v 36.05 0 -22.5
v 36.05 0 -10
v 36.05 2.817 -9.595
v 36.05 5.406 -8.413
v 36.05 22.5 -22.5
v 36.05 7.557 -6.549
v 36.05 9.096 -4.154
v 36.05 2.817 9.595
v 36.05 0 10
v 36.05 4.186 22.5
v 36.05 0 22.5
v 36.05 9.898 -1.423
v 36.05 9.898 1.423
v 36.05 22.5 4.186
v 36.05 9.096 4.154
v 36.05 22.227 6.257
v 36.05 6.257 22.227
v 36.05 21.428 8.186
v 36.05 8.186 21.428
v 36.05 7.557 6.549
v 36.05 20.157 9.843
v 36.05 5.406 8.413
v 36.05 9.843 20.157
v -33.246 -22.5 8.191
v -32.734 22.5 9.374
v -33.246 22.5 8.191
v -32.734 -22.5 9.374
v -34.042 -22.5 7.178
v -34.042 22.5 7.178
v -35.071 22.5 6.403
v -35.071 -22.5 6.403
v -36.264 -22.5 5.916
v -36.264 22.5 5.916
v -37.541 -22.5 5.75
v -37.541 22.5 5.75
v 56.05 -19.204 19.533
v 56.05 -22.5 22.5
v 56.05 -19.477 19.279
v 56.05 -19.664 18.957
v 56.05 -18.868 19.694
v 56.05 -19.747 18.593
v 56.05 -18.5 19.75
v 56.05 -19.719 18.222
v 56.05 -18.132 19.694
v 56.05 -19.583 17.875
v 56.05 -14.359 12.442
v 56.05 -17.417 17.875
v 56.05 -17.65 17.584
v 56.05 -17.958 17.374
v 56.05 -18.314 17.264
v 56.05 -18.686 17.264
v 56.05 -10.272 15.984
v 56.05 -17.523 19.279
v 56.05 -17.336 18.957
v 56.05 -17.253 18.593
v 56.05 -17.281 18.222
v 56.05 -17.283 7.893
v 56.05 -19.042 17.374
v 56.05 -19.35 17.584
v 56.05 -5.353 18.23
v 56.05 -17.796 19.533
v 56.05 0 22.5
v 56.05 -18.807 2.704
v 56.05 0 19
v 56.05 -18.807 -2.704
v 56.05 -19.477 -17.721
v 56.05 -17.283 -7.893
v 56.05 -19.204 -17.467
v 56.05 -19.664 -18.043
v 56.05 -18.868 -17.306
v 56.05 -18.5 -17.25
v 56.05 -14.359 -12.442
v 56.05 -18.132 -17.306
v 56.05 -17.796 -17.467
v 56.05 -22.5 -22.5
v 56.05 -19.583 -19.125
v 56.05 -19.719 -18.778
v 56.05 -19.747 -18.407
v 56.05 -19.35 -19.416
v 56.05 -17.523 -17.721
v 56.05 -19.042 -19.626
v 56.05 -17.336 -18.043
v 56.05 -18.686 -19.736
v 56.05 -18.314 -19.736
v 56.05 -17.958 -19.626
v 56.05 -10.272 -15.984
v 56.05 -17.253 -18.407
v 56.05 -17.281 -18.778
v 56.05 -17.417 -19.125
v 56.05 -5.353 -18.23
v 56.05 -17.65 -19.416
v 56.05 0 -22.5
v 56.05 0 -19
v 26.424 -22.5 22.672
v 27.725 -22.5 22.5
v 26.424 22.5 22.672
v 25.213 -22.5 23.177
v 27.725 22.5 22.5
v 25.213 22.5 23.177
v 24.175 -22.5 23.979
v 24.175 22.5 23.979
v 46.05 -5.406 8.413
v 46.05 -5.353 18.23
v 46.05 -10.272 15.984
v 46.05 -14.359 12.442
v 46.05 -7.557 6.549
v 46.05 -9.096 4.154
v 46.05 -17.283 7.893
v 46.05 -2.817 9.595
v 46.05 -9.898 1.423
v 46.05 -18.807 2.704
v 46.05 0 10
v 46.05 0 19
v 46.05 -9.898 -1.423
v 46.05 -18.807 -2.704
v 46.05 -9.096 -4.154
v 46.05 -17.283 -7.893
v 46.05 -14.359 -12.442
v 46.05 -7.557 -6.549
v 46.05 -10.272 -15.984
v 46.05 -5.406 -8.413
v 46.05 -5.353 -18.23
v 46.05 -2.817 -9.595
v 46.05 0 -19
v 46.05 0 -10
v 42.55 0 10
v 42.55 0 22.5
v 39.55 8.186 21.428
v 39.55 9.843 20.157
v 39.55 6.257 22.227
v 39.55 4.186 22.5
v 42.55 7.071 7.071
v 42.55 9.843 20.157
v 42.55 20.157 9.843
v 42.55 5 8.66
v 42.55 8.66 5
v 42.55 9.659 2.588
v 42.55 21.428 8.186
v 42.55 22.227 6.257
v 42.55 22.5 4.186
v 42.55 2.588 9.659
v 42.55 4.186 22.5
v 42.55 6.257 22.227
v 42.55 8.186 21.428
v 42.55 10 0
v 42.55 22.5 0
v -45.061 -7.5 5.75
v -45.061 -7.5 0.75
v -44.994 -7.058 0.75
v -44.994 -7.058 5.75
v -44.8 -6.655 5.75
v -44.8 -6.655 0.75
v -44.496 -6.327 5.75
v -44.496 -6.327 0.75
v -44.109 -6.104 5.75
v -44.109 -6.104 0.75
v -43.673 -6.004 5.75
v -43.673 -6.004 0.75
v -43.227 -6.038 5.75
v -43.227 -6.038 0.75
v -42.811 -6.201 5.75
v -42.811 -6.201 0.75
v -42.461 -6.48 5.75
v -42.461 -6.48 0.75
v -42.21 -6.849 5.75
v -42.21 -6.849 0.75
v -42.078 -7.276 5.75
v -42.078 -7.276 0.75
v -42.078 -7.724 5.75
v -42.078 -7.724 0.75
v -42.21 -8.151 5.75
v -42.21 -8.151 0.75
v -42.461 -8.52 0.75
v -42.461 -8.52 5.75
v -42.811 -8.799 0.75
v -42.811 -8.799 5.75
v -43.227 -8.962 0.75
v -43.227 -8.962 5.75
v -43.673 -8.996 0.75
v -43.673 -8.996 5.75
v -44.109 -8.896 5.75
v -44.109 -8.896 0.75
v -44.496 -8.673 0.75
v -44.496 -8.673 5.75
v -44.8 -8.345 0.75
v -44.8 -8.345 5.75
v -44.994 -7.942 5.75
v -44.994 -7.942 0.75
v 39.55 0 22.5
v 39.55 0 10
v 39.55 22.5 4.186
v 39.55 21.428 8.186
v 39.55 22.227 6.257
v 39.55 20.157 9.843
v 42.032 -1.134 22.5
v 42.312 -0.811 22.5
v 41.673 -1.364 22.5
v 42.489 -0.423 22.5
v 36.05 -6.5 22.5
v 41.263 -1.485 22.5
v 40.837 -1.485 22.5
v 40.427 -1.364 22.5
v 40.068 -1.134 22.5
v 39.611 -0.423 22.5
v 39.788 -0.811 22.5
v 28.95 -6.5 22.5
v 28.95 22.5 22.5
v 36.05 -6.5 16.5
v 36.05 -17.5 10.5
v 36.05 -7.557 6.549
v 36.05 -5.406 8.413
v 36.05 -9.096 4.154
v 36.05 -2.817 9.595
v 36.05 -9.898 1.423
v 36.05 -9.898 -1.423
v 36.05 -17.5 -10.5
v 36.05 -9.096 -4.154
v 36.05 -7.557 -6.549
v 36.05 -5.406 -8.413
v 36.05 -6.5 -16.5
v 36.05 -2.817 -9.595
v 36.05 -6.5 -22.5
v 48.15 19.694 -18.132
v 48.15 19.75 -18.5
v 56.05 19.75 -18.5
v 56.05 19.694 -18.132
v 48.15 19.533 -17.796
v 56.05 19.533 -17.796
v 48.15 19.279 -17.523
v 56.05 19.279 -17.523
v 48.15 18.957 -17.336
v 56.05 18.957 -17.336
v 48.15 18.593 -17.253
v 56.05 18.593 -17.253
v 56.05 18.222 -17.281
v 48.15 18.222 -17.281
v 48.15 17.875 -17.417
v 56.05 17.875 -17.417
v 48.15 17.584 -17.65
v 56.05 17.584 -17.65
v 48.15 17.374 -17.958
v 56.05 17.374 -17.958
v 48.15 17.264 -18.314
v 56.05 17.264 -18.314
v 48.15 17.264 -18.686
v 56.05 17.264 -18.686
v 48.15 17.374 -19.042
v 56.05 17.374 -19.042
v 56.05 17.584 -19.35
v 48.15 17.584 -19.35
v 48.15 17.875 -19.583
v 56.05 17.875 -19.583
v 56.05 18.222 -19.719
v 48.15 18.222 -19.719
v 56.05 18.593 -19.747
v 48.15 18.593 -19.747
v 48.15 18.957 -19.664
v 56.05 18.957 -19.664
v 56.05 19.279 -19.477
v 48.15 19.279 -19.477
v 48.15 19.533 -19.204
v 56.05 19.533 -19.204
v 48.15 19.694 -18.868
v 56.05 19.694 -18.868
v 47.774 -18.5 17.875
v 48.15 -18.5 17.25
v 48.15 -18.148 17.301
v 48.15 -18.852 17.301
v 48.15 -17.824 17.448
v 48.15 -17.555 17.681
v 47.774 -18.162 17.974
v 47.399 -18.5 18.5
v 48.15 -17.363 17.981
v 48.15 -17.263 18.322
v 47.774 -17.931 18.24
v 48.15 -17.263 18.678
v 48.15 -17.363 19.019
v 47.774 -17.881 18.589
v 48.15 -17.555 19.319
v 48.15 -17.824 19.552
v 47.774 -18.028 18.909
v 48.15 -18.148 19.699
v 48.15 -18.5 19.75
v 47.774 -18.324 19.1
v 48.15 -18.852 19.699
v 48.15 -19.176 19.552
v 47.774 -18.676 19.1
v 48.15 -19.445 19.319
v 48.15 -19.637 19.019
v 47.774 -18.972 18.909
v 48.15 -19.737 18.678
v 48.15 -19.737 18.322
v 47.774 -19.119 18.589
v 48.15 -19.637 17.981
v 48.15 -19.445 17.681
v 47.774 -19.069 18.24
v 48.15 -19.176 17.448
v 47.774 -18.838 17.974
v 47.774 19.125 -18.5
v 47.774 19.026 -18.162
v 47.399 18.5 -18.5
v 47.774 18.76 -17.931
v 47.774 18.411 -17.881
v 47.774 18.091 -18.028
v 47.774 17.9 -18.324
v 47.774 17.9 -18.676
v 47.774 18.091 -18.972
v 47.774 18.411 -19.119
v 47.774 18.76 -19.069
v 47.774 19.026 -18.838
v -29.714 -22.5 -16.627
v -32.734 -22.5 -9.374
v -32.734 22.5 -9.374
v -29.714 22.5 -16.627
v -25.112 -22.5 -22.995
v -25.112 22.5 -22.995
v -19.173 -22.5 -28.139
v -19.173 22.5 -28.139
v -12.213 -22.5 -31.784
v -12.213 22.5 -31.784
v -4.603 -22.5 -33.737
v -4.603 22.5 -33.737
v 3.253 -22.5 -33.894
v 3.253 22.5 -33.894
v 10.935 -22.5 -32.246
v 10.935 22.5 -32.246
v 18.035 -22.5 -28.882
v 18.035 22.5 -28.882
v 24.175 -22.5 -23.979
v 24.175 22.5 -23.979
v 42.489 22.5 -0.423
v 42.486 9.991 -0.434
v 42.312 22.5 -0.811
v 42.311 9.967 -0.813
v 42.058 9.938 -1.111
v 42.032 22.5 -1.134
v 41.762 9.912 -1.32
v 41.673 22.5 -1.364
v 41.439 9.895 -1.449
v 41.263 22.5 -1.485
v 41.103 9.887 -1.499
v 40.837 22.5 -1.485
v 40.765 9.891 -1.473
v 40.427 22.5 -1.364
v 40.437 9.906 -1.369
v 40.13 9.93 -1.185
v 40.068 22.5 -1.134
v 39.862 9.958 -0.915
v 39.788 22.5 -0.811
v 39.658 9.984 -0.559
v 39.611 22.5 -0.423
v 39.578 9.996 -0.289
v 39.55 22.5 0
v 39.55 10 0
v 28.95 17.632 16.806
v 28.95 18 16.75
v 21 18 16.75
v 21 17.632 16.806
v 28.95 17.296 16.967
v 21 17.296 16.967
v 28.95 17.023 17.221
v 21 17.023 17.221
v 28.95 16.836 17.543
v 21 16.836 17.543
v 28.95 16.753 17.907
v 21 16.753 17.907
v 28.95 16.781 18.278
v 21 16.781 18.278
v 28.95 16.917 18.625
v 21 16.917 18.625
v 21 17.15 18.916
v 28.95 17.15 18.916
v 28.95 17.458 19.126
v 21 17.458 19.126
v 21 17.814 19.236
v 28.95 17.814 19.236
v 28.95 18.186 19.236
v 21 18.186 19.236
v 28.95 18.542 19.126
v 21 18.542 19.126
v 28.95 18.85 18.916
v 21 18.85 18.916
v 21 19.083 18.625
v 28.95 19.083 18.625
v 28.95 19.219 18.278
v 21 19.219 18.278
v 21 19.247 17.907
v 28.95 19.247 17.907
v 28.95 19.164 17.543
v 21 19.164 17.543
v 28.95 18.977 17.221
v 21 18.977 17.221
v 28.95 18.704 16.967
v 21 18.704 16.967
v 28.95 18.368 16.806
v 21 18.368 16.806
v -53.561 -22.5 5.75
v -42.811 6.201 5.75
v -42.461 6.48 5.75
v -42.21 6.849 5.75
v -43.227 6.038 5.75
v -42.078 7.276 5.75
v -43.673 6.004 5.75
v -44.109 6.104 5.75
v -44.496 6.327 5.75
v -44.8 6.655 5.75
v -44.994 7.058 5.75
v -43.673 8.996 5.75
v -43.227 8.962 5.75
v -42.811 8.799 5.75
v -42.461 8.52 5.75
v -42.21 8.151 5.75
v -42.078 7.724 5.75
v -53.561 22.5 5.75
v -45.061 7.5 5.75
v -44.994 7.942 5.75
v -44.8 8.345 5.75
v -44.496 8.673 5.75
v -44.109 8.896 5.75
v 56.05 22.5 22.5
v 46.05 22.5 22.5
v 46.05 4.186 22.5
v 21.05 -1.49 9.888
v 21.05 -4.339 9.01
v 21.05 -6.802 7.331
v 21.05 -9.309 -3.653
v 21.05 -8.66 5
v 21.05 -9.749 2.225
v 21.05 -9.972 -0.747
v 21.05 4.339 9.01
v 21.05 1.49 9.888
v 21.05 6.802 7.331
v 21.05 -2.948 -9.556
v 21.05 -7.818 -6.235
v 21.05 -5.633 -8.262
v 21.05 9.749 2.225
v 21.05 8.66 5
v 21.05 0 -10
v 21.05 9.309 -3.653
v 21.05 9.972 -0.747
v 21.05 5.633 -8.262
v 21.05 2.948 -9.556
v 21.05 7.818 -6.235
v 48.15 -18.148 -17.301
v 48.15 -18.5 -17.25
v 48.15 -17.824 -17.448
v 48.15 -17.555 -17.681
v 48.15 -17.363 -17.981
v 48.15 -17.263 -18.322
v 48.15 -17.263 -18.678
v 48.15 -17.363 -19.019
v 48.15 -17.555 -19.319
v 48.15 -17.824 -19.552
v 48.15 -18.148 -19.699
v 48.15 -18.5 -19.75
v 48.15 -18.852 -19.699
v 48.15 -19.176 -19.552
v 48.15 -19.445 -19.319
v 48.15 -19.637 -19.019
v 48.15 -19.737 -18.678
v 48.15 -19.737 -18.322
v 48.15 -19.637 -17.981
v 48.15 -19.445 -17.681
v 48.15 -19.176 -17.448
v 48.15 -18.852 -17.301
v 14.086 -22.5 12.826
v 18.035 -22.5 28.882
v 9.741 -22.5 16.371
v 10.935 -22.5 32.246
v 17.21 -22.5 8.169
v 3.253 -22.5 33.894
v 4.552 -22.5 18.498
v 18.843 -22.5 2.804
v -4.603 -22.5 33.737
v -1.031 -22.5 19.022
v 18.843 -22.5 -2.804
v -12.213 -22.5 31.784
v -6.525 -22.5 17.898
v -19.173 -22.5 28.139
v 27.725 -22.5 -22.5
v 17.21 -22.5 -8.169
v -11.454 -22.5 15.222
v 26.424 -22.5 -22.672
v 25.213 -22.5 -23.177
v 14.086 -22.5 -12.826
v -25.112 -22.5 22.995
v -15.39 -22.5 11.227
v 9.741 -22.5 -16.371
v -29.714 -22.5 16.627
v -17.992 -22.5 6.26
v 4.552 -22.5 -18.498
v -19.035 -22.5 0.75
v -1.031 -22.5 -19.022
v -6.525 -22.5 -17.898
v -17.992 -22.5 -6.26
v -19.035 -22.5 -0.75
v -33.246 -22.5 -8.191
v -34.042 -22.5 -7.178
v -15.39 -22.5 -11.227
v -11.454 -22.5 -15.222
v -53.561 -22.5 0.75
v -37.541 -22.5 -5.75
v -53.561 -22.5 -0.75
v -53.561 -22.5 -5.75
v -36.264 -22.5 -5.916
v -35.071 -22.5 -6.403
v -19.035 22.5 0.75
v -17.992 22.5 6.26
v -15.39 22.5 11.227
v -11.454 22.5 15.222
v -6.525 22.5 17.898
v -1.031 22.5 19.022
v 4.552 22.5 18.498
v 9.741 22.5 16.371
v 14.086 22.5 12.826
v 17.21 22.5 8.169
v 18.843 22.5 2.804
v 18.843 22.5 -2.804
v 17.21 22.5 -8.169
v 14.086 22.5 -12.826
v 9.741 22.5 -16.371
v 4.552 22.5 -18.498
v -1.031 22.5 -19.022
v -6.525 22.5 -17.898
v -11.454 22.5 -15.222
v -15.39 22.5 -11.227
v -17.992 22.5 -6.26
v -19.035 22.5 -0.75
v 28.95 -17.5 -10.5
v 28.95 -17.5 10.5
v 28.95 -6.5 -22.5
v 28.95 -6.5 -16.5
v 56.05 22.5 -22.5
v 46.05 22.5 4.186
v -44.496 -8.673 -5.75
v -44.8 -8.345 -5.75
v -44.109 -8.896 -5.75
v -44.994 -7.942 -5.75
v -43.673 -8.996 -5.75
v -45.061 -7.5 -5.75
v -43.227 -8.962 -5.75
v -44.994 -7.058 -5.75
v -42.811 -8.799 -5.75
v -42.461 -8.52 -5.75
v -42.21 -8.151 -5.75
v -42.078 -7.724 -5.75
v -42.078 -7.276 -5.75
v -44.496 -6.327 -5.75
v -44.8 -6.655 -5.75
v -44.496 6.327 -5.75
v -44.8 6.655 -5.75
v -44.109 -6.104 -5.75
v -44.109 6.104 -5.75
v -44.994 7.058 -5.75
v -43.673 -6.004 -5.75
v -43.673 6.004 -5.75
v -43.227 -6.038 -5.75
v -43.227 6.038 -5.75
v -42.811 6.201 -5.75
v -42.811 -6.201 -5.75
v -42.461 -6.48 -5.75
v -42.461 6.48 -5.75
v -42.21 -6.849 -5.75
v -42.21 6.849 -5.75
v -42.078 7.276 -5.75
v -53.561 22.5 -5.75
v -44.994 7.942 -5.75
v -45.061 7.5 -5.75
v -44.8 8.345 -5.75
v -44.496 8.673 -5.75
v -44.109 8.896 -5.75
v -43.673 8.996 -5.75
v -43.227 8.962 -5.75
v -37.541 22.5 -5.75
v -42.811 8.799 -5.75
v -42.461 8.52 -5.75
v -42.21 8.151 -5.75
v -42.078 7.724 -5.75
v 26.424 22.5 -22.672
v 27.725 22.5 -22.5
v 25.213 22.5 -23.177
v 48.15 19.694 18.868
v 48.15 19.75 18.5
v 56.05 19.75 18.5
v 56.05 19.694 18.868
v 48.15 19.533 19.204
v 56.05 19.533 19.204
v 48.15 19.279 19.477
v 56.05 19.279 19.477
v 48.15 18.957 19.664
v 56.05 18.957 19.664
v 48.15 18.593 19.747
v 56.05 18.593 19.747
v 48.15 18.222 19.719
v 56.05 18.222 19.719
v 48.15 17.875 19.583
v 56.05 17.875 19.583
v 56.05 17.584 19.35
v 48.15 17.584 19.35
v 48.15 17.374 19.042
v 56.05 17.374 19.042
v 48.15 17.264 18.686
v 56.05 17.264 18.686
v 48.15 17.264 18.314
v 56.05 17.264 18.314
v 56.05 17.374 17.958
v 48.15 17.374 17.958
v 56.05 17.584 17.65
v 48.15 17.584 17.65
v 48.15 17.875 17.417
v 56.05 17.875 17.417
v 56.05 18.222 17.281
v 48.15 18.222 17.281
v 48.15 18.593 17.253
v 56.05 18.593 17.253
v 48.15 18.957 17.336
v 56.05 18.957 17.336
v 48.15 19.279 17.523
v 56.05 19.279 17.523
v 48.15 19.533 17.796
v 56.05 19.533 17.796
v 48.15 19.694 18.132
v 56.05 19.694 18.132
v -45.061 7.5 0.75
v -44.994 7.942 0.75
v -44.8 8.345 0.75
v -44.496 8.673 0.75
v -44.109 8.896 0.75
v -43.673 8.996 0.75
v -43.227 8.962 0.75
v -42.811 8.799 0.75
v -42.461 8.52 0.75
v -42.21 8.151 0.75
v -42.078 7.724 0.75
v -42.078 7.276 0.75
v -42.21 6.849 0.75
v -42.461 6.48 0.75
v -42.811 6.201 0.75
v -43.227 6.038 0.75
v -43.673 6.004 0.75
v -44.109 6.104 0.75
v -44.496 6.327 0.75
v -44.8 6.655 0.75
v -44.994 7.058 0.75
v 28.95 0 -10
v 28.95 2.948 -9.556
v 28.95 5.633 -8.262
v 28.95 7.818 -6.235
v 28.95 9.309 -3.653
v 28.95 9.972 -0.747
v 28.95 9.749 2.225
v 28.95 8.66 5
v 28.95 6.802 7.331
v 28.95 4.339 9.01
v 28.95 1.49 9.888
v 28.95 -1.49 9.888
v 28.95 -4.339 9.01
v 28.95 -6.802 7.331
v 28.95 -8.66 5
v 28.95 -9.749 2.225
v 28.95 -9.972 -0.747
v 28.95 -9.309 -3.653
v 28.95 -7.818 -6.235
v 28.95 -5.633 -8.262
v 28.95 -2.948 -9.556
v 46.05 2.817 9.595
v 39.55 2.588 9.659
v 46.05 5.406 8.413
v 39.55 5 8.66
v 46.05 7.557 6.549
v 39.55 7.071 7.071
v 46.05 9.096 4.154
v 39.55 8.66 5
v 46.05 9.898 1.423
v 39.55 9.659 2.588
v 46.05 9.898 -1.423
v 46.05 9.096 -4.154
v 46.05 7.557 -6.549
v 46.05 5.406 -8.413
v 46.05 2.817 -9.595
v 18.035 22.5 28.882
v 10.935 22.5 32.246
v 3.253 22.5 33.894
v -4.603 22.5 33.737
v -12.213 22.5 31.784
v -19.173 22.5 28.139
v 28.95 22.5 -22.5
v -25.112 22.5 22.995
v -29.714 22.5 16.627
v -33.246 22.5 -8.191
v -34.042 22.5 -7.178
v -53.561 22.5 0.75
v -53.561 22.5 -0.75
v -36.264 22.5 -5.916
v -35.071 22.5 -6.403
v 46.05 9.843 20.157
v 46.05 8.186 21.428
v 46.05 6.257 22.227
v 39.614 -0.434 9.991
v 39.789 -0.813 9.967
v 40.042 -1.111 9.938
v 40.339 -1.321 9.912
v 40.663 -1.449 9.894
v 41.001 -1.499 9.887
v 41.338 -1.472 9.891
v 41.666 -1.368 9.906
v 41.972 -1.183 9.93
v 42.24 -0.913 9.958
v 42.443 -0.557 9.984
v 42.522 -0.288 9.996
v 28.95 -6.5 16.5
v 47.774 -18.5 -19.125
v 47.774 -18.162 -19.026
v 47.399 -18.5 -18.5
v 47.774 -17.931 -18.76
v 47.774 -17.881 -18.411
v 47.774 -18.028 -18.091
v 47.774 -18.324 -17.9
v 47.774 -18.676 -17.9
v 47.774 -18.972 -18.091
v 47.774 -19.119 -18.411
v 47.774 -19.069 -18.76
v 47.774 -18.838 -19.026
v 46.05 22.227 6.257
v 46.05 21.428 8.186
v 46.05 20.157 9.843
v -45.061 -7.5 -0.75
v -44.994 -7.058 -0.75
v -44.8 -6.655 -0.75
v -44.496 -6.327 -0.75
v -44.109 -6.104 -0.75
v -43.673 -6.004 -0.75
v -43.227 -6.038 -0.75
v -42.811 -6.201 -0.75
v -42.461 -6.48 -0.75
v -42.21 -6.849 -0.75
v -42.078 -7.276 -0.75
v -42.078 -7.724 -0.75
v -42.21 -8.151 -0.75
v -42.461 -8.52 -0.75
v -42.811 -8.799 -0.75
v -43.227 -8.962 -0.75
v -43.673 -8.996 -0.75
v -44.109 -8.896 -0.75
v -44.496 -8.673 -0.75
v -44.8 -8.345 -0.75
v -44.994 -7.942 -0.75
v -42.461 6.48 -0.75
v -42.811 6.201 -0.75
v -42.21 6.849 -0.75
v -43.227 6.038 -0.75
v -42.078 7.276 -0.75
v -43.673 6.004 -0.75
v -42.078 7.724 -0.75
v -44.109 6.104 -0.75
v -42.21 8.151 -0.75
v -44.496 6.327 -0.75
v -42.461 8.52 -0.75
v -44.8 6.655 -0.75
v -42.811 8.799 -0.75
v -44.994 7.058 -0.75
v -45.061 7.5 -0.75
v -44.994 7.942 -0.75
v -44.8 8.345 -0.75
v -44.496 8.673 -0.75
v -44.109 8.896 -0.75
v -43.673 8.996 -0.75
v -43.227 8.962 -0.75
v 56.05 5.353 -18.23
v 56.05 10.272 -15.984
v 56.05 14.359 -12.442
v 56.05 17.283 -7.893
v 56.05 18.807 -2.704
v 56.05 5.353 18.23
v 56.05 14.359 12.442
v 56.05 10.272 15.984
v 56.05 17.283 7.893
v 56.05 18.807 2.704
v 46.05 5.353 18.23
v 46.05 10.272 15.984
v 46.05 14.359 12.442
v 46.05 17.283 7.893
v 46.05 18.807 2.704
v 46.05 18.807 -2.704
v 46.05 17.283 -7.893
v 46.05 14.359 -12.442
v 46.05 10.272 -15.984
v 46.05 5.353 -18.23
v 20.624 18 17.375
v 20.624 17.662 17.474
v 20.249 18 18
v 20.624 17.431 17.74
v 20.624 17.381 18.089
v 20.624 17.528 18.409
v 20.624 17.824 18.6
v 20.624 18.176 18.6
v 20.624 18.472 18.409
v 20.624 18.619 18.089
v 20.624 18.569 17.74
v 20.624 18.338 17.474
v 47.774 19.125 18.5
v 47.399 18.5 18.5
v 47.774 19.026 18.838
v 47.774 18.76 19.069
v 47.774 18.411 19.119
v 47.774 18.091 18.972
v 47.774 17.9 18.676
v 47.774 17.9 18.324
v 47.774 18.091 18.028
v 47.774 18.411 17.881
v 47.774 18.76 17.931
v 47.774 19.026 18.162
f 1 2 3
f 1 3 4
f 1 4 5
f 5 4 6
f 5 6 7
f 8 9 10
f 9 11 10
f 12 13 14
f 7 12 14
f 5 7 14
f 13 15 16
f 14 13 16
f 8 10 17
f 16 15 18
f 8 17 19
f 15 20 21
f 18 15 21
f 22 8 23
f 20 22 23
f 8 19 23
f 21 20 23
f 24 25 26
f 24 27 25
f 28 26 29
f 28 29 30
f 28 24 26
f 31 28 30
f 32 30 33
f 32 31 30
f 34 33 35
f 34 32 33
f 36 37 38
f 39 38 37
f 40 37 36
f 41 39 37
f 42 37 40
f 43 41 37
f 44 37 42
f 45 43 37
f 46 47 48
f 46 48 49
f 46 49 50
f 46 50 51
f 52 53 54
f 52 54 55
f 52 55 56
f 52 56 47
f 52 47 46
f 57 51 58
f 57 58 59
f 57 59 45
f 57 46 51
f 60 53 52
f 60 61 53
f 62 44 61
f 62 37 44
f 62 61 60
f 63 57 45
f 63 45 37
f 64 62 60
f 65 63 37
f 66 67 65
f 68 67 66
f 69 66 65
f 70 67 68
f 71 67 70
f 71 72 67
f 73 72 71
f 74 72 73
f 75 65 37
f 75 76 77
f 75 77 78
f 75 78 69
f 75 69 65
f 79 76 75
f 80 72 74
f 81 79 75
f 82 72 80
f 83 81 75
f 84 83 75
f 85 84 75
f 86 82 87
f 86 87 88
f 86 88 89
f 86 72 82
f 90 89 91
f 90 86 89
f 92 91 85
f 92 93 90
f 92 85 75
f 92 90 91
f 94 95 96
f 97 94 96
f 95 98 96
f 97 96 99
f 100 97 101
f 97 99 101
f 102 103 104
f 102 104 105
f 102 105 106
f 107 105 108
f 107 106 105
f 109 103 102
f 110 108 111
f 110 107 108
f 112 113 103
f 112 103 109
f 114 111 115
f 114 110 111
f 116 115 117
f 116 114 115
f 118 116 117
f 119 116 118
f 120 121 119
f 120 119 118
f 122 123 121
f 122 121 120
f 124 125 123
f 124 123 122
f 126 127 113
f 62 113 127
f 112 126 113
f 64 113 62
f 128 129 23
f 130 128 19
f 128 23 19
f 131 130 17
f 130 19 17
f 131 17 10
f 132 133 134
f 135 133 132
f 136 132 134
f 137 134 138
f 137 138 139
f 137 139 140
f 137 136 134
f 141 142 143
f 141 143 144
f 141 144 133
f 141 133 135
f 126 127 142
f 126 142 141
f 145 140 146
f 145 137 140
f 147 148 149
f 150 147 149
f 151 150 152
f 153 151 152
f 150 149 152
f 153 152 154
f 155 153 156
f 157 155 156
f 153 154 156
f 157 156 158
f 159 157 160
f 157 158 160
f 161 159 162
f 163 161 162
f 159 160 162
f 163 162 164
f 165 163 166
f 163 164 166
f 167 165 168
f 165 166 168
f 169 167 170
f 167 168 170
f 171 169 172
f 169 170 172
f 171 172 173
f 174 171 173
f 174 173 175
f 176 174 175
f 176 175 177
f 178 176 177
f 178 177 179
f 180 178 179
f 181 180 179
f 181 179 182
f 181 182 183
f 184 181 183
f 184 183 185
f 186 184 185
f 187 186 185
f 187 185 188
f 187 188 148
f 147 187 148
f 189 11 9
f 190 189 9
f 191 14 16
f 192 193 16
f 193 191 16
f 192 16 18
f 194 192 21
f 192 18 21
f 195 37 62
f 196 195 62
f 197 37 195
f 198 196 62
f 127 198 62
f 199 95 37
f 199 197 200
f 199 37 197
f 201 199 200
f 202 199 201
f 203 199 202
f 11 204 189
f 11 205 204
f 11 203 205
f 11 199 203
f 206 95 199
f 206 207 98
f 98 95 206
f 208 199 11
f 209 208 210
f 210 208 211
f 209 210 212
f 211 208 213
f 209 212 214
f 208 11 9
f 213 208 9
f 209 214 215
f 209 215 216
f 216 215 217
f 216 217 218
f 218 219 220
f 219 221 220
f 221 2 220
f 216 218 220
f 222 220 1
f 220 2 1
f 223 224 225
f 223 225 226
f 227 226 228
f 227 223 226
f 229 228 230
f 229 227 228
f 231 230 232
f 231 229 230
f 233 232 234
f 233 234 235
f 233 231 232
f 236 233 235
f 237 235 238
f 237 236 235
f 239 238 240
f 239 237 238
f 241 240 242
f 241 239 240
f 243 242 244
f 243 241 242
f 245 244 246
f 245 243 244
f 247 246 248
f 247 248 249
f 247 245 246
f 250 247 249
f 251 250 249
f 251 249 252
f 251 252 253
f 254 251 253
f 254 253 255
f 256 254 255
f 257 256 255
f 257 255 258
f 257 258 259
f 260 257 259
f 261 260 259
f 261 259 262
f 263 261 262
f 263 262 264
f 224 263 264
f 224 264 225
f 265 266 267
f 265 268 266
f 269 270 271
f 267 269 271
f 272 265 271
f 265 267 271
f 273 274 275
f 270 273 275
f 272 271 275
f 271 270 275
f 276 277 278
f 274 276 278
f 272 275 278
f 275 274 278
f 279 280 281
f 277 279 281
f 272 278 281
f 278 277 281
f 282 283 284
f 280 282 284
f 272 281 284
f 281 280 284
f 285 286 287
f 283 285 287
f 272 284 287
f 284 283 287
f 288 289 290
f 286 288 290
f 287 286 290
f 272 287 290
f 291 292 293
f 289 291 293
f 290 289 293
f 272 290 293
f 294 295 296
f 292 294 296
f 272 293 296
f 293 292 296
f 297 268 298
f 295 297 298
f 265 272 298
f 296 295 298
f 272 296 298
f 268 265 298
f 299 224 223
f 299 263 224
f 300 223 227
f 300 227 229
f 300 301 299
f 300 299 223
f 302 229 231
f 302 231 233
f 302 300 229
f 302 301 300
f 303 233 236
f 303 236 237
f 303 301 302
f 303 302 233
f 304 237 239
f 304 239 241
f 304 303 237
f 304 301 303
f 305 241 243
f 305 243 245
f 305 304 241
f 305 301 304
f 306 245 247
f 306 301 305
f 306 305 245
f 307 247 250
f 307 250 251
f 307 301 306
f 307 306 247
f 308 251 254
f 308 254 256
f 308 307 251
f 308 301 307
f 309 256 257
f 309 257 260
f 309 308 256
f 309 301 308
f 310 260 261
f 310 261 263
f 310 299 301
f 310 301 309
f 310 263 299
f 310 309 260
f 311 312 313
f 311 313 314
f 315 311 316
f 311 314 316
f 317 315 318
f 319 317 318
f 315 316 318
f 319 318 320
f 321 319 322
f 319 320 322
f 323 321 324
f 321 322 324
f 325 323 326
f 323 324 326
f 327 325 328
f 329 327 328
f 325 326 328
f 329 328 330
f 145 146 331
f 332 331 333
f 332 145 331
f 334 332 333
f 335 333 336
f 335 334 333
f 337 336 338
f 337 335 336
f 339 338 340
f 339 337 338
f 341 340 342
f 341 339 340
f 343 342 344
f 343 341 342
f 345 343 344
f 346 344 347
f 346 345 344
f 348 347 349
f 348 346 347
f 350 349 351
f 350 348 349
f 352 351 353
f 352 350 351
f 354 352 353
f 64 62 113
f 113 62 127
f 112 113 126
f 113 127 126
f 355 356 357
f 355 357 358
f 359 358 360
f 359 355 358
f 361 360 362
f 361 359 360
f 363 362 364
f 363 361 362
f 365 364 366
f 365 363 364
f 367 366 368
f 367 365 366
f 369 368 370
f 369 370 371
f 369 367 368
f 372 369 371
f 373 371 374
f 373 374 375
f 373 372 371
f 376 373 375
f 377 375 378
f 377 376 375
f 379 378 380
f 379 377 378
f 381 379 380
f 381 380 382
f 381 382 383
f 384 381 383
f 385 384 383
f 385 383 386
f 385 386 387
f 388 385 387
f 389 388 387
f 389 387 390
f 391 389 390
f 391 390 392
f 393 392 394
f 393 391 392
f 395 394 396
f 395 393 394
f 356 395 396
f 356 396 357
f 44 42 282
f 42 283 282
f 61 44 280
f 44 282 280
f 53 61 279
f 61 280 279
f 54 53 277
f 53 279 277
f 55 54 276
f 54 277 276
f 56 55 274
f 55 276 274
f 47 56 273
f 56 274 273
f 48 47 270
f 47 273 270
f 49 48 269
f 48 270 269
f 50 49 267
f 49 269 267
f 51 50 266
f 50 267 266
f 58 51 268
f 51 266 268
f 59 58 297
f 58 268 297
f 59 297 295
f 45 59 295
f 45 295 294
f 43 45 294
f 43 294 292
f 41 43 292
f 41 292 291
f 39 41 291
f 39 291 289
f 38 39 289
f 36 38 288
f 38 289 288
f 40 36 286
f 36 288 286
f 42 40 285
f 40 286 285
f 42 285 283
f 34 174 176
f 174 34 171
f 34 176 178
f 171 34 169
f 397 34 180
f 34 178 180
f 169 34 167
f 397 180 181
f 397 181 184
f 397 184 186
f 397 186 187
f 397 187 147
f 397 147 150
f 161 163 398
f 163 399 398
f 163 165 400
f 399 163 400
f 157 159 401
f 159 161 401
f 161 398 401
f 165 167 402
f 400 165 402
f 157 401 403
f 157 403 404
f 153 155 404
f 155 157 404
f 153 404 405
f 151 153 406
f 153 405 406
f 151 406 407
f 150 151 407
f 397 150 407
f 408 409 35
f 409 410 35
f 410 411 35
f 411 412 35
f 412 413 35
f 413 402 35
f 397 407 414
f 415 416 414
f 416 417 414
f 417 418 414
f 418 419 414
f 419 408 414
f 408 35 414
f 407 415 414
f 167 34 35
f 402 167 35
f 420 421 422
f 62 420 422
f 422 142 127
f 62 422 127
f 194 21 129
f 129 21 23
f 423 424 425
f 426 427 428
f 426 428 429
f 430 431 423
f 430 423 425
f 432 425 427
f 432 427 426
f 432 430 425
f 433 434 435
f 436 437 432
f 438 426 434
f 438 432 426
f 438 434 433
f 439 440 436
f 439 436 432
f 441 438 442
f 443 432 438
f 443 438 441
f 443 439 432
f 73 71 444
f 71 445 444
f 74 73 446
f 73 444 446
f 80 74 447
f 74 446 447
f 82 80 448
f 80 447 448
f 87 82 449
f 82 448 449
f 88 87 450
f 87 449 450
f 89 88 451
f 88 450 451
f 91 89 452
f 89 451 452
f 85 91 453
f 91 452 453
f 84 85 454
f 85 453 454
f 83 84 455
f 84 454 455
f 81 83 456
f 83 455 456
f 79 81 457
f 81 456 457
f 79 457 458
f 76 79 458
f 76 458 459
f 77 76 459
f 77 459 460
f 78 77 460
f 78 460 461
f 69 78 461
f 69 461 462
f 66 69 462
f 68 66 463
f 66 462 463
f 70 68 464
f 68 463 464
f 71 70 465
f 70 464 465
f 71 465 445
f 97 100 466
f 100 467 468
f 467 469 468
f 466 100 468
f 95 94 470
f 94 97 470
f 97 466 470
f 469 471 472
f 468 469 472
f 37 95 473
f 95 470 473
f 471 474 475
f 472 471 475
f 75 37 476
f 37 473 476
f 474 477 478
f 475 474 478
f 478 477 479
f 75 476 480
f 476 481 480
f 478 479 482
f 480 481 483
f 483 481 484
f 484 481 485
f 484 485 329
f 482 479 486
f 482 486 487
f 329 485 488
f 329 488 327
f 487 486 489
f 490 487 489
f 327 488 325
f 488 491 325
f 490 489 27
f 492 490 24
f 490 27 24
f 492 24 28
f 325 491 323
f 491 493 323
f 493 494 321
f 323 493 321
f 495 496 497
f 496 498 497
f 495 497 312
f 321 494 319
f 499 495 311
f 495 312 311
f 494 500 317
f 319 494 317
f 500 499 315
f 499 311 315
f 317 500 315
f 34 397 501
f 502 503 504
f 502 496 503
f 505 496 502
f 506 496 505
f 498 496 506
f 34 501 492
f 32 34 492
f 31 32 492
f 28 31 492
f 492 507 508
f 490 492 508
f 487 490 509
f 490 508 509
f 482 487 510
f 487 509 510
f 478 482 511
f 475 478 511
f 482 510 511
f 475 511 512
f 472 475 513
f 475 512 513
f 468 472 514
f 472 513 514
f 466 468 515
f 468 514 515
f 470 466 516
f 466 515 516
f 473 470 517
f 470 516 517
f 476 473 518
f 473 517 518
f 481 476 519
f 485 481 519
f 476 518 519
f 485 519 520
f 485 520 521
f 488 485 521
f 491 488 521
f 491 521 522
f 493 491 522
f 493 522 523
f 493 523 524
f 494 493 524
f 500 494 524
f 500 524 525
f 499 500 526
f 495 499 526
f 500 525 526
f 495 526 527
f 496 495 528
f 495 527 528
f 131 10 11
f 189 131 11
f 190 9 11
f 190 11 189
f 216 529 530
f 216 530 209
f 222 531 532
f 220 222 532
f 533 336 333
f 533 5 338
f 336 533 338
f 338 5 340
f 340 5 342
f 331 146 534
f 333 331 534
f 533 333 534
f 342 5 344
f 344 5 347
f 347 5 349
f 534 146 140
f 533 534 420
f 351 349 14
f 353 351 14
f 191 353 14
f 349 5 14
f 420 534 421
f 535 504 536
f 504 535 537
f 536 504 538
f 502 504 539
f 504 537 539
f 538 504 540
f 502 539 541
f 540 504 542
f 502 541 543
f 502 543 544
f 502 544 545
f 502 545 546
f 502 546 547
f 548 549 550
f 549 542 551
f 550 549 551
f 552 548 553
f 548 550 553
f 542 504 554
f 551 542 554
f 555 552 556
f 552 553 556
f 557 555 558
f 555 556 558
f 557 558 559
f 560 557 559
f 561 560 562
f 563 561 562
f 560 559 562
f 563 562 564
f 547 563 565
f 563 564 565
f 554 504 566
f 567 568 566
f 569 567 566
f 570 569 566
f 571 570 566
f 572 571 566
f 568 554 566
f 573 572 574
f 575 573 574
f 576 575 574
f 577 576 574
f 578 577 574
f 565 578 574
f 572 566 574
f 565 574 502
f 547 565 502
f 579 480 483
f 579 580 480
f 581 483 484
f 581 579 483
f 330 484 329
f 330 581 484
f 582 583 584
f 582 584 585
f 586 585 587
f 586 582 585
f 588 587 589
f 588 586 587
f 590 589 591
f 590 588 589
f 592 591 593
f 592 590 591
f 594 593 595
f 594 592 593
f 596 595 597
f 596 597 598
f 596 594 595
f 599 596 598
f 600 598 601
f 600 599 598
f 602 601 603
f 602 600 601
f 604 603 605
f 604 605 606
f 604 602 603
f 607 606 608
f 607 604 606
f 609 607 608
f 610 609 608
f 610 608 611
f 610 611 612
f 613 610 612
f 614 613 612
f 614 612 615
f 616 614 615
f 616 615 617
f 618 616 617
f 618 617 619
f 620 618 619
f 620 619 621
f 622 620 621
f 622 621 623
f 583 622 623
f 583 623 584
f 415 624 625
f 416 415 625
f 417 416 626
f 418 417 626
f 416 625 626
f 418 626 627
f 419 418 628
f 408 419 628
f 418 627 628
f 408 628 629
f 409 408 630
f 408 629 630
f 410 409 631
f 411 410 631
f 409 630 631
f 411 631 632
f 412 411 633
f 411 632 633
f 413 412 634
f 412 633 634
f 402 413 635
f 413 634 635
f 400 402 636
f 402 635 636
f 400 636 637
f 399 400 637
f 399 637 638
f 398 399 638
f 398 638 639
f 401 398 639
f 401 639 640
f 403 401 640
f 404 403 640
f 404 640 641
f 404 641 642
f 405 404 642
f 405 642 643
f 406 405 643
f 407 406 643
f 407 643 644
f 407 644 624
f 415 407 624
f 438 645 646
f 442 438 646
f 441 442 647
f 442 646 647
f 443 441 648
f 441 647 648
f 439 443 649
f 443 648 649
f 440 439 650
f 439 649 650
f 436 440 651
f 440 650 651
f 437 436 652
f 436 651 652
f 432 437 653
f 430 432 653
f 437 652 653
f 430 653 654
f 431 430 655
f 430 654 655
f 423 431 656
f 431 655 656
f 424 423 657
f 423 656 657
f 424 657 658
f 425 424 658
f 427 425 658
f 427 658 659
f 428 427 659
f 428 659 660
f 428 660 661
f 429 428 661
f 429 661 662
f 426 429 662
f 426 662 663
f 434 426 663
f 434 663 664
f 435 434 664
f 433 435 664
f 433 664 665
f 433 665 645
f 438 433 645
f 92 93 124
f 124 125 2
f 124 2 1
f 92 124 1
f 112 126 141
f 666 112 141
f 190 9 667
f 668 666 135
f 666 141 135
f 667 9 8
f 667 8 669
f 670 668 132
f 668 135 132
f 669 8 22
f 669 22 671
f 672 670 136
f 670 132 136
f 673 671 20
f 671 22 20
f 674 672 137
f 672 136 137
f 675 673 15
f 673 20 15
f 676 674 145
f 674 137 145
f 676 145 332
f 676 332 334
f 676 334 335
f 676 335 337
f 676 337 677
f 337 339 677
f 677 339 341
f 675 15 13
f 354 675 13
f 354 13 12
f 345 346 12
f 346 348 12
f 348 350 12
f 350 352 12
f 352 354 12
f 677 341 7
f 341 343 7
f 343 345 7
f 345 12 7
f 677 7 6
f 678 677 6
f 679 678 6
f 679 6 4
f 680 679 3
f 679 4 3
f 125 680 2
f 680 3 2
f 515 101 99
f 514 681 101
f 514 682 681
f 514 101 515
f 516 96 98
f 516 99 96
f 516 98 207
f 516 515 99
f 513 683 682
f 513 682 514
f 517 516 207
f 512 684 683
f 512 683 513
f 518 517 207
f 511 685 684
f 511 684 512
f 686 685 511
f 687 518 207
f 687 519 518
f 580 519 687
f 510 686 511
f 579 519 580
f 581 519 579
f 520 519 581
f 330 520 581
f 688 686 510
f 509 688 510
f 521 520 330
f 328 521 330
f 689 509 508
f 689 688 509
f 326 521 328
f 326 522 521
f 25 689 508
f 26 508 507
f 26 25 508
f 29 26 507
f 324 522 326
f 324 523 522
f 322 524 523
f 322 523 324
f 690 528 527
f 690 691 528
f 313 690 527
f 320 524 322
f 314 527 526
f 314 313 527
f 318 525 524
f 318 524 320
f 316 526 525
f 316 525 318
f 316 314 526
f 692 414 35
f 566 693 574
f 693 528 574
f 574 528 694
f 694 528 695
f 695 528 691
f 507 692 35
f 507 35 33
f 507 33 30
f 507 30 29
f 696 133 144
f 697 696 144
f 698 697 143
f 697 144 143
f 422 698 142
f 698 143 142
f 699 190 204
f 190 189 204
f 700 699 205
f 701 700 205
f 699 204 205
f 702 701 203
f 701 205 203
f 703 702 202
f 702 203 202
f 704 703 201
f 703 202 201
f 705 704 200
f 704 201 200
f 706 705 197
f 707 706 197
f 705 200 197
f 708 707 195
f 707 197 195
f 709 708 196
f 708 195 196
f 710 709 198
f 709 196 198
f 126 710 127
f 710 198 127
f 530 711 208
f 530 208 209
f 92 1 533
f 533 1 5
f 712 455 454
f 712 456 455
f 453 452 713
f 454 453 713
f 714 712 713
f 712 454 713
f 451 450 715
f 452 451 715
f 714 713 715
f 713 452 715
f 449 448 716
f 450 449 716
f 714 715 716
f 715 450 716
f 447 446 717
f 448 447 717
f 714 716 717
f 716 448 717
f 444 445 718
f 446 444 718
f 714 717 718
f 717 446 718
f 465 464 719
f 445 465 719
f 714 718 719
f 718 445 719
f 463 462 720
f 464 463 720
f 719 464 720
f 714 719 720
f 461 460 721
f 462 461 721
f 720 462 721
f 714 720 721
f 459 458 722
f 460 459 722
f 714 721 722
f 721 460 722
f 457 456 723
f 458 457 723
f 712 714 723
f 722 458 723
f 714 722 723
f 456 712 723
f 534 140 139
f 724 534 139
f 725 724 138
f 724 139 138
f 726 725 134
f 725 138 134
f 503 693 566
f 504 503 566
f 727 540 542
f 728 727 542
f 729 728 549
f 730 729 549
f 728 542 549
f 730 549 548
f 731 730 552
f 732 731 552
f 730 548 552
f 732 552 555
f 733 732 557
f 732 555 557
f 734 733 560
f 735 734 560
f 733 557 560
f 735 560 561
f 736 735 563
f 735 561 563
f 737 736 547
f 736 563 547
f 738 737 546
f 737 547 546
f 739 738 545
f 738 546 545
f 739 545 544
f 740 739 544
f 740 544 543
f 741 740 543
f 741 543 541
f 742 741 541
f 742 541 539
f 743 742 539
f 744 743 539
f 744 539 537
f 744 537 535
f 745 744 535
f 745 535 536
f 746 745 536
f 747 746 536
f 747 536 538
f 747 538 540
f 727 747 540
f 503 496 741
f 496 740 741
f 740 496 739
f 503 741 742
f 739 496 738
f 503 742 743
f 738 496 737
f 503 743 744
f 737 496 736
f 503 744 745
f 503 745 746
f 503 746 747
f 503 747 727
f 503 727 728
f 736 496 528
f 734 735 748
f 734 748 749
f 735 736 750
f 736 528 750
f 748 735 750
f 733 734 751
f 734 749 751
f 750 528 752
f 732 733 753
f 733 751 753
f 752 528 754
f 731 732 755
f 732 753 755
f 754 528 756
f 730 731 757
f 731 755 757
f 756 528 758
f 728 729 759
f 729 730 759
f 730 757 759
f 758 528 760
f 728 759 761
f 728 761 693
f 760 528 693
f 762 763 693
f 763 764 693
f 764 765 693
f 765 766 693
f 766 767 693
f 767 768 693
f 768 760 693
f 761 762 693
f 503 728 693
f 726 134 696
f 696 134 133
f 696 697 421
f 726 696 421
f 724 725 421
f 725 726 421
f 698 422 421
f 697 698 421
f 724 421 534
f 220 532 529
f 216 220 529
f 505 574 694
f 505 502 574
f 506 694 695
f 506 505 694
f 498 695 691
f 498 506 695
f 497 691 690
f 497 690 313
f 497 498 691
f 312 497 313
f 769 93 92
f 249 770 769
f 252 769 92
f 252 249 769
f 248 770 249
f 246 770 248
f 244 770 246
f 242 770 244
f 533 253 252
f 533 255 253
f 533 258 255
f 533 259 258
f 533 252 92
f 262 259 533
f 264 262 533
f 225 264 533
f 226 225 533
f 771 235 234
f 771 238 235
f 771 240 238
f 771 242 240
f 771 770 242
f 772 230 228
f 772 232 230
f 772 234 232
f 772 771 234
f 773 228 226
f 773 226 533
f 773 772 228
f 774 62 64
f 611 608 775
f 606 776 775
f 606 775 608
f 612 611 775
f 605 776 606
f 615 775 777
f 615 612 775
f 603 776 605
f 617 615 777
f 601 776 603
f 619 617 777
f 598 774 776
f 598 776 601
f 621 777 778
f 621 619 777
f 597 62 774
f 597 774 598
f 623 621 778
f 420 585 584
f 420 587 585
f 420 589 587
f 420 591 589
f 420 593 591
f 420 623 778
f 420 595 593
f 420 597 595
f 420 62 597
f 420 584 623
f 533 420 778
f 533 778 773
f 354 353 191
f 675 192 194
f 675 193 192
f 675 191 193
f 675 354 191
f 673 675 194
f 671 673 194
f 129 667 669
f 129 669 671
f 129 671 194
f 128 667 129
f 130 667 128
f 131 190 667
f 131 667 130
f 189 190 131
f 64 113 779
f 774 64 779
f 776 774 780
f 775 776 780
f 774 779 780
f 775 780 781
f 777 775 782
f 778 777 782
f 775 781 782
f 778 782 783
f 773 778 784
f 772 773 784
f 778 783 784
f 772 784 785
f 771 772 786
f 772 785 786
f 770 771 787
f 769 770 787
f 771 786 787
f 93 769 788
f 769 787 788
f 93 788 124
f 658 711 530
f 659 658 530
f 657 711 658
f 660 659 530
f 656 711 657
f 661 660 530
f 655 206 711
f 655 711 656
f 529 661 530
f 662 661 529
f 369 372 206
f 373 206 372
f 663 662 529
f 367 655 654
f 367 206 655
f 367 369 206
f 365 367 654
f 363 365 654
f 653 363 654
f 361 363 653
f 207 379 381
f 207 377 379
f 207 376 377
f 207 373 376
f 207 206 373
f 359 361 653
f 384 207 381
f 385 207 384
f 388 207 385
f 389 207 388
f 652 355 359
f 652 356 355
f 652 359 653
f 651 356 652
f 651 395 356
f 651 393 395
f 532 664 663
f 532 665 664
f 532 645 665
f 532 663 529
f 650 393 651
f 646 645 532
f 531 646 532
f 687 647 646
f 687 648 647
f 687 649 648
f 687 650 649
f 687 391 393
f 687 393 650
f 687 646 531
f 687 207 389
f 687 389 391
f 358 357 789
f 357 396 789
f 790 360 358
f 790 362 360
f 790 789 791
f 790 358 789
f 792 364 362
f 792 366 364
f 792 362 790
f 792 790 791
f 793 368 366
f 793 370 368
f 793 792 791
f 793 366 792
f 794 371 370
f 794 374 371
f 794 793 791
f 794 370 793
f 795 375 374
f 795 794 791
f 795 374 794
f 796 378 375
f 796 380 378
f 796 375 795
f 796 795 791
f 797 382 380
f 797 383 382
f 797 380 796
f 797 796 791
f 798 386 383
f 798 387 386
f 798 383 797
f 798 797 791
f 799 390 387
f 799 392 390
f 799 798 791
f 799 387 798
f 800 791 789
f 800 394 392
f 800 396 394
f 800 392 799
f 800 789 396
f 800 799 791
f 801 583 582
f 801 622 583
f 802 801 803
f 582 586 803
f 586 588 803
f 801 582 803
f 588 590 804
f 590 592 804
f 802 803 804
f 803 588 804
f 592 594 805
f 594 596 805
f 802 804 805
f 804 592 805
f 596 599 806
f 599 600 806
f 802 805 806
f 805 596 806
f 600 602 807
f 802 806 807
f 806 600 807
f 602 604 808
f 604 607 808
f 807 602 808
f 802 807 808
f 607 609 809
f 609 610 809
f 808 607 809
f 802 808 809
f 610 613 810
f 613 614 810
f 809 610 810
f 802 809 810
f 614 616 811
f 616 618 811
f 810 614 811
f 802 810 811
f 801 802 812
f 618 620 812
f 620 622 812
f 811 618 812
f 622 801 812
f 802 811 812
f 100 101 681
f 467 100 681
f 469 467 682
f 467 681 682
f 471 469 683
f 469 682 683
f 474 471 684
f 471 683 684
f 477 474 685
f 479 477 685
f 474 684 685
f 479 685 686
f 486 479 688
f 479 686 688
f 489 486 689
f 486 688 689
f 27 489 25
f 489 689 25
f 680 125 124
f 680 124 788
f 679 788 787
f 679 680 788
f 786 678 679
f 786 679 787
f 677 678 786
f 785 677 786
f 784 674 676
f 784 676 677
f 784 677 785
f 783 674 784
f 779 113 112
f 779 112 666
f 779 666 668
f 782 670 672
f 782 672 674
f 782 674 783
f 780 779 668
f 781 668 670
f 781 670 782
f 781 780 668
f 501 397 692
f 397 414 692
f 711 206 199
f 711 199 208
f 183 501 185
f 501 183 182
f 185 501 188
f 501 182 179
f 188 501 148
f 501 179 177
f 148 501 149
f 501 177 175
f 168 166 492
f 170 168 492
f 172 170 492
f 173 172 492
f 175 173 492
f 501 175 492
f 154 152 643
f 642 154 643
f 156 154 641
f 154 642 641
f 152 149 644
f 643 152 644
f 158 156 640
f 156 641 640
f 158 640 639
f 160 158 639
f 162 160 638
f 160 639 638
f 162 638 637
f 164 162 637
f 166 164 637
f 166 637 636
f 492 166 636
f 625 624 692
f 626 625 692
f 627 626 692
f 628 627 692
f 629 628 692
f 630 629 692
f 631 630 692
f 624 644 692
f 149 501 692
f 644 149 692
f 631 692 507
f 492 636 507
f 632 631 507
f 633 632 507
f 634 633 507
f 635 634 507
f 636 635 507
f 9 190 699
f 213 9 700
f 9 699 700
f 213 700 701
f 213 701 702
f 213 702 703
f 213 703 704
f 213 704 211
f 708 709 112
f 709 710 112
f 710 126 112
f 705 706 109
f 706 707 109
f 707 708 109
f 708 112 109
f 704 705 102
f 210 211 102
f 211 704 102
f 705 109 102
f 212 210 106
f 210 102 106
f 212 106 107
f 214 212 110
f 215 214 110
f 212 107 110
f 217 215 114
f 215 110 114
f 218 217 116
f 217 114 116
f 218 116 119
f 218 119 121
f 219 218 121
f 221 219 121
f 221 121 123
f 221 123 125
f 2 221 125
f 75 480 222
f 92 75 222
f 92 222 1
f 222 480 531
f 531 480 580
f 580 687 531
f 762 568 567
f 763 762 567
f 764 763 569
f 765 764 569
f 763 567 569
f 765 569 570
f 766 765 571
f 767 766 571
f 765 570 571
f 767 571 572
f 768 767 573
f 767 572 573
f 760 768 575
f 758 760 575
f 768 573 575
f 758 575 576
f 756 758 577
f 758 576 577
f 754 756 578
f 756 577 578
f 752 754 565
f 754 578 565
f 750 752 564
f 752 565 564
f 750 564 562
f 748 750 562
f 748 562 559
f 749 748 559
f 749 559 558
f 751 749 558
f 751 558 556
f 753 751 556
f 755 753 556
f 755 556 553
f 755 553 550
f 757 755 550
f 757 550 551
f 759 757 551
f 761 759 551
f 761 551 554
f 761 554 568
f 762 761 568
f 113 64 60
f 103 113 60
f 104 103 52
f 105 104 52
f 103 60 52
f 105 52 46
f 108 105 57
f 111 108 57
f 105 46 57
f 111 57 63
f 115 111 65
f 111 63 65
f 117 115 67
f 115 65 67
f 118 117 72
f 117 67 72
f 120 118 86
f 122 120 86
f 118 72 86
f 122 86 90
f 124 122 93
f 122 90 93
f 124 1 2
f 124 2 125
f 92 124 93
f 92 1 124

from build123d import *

# Parameters (mm, degrees)
BOSS_EXTRUDE1_DEPTH       = 22.5
F_3_0MM_DOWEL_HOLE1_D     = 3
BOSS_EXTRUDE2_START       = -8.493151603
BOSS_EXTRUDE2_OUTLINE_W   = 45
BOSS_EXTRUDE2_OUTLINE_H   = 45
BOSS_EXTRUDE2_DEPTH       = 30.493151603
SKETCH5_R                 = 10
CUT_EXTRUDE1_DEPTH        = 35
SKETCH16_R                = 19
CUT_EXTRUDE9_DEPTH        = 10
CUT_EXTRUDE2_START        = 22.5
SKETCH7_W                 = 7.1
SKETCH7_H                 = 45
CUT_EXTRUDE2_DEPTH        = 40
SKETCH8_W                 = 22.5
SKETCH8_H                 = 22.5
CUT_EXTRUDE3_DEPTH        = 1.5
CUT_EXTRUDE5_OUTLINE_W    = 1.5
CUT_EXTRUDE5_OUTLINE_H    = 12.613186919
CUT_EXTRUDE8_START        = 9
CUT_EXTRUDE8_DEPTH        = 14
CHAMFER1_START            = 36.05
CHAMFER1_DEPTH            = 10
FILLET3_R                 = 5
FILLET4_R                 = 8
BOSS_EXTRUDE3_DEPTH       = 7.1
M3X0_5_TAPPED_HOLE1_D     = 2.5
M3X0_5_TAPPED_HOLE1_DEPTH = 15
M3X0_5_TAPPED_HOLE1_TIP   = 0.751075774
SPLIT1_START              = 36.05
SPLIT1_2_DEPTH            = 10
SPLIT1_START_2            = 46.05
SPLIT1_3_OUTLINE_R        = 1.25
SPLIT1_3_DEPTH            = 10
SPLIT1_4_OUTLINE_R        = 1.25
SPLIT1_4_DEPTH            = 1.348924226
SPLIT1_START_3            = 47.398924226
SPLIT1_5_OUTLINE_R        = 1.25
SPLIT1_5_DEPTH            = 0.751075674
SPLIT1_6_DEPTH            = 22.5
SPLIT1_8_DEPTH            = 22.5


with BuildPart() as part:
    # Sketch3 → Boss-Extrude1 (new, symmetric)
    with BuildSketch(Plane(origin=(0, 0, 0), x_dir=(1, 0, 0), z_dir=(0, 1, 0))):
        with BuildLine():
            Line((-53.560989258, 0.75), (-53.560989258, 5.75))
            Line((-53.560989258, 5.75), (-33.560989258, 5.75))
            ThreePointArc((-33.560989258, 5.75), (34.05, 0), (-33.560989258, -5.75))
            Line((-33.560989258, -5.75), (-53.560989258, -5.75))
            Line((-53.560989258, -5.75), (-53.560989258, -0.75))
            Line((-53.560989258, -0.75), (-19.035230495, -0.75))
            ThreePointArc((-19.035230495, -0.75), (19.05, 0), (-19.035230495, 0.75))
            Line((-19.035230495, 0.75), (-53.560989258, 0.75))
        make_face()
    extrude(amount=BOSS_EXTRUDE1_DEPTH, both=True)

    # Ø3.0mm Dowel Hole1 (through all)
    with Locations(Plane.XY.offset(5.75)):
        with Locations((-43.560989258, 7.5), (-43.560989258, -7.5)):
            Hole(F_3_0MM_DOWEL_HOLE1_D / 2)

    # Boss-Extrude2: read off the stored shape, not the designer's step
    # Boss-Extrude2 outline → Boss-Extrude2 (add)
    with BuildSketch(Plane(origin=(34.05, 0, 0), x_dir=(0, 0, -1), z_dir=(1, 0, 0)).offset(BOSS_EXTRUDE2_START)):
        Rectangle(BOSS_EXTRUDE2_OUTLINE_W, BOSS_EXTRUDE2_OUTLINE_H)
    extrude(amount=BOSS_EXTRUDE2_DEPTH)

    # Sketch5 → Cut-Extrude1 (cut)
    with BuildSketch(Plane(origin=(56.05, 0, 0), x_dir=(0, 0, -1), z_dir=(1, 0, 0))):
        Circle(SKETCH5_R)
    extrude(amount=-CUT_EXTRUDE1_DEPTH, mode=Mode.SUBTRACT)

    # Sketch16 → Cut-Extrude9 (cut)
    with BuildSketch(Plane(origin=(56.05, 0, 0), x_dir=(0, 0, -1), z_dir=(1, 0, 0))):
        Circle(SKETCH16_R)
    extrude(amount=-CUT_EXTRUDE9_DEPTH, mode=Mode.SUBTRACT)

    # Sketch7 → Cut-Extrude2 (cut)
    with BuildSketch(Plane(origin=(0, 0, 0), x_dir=(1, 0, 0), z_dir=(0, 1, 0)).offset(CUT_EXTRUDE2_START)):
        with Locations((32.5, 0)):
            Rectangle(SKETCH7_W, SKETCH7_H)
    extrude(amount=-CUT_EXTRUDE2_DEPTH, mode=Mode.SUBTRACT)

    # Sketch8 → Cut-Extrude3 (cut, symmetric)
    with BuildSketch(Plane.ZY.offset(-41.05)):
        with Locations((11.25, 11.25)):
            Rectangle(SKETCH8_W, SKETCH8_H)
    extrude(amount=CUT_EXTRUDE3_DEPTH, both=True, mode=Mode.SUBTRACT)

    # Cut-Extrude5: read off the stored shape, not the designer's step
    # Cut-Extrude5 outline → Cut-Extrude5 (revolve, cut)
    with BuildSketch(Plane(origin=(41.05, 0, 0), x_dir=(1, 0, 0), z_dir=(0, -1, 0))):
        with Locations((0.75, 16.19340654)):
            Rectangle(CUT_EXTRUDE5_OUTLINE_W, CUT_EXTRUDE5_OUTLINE_H)
    revolve(axis=Axis((41.05, 0, 0), (0, 0, 1)), mode=Mode.SUBTRACT)

    # Cut-Extrude8: read off the stored shape, not the designer's step
    # Cut-Extrude8 outline → Cut-Extrude8 (cut)
    with BuildSketch(Plane(origin=(0, 0, 0), x_dir=(1, 0, 0), z_dir=(0, 1, 0)).offset(CUT_EXTRUDE8_START)):
        with BuildLine():
            ThreePointArc((42.55, 0), (41.05, 1.5), (39.55, 0))
            Line((39.55, 0), (42.55, 0))
        make_face()
    extrude(amount=CUT_EXTRUDE8_DEPTH, mode=Mode.SUBTRACT)

    # Chamfer1: read off the stored shape, not the designer's step
    # Chamfer1 outline → Chamfer1 (cut)
    with BuildSketch(Plane.YZ.offset(CHAMFER1_START)):
        Polygon((22.5, 22.5), (7.5, 22.5), (22.5, 7.5), align=None)
    extrude(amount=CHAMFER1_DEPTH, mode=Mode.SUBTRACT)

    # Fillet3
    fillet3_edges = [part.edges().sort_by_distance(p)[0] for p in [
        (-33.560989258, 0, -5.75),
        (-33.560989258, 0, 5.75),
        (25.556848397, 0, -22.5),
        (25.556848397, 0, 22.5),
    ]]
    fillet(fillet3_edges, radius=FILLET3_R)

    # Fillet4
    fillet4_edges = [part.edges().sort_by_distance(p)[0] for p in [
        (37.8, 22.5, 7.5),
        (44.3, 22.5, 7.5),
        (37.8, 7.5, 22.5),
        (44.3, 7.5, 22.5),
    ]]
    fillet(fillet4_edges, radius=FILLET4_R)

    # Sketch15 → Boss-Extrude3 (add)
    with BuildSketch(Plane(origin=(28.95, 0, 0), x_dir=(0, 0, -1), z_dir=(1, 0, 0))):
        Polygon((-22.5, -6.5), (-16.5, -6.5), (-10.5, -17.5), (-22.5, -17.5), align=None)
        Polygon((22.5, -6.5), (16.5, -6.5), (10.5, -17.5), (22.5, -17.5), align=None)
    extrude(amount=BOSS_EXTRUDE3_DEPTH)

    # M3x0.5 Tapped Hole1
    with Locations(Plane(origin=(63.15, 0, 0), x_dir=(0, 0, -1), z_dir=(1, 0, 0))):
        with Locations((-18.5, 18.5), (-18.5, -18.5), (18.5, -18.5), (18.5, 18.5)):
            Hole(M3X0_5_TAPPED_HOLE1_D / 2, depth=M3X0_5_TAPPED_HOLE1_DEPTH)
            with Locations((0, 0, -(M3X0_5_TAPPED_HOLE1_DEPTH + M3X0_5_TAPPED_HOLE1_TIP / 2))):  # 118° drill point
                Cone(0, M3X0_5_TAPPED_HOLE1_D / 2, M3X0_5_TAPPED_HOLE1_TIP, mode=Mode.SUBTRACT)

    # Sketch20 → M3x0.5 Tapped Hole2 (revolve, cut)
    with BuildSketch(Plane(origin=(36, 18, 18), x_dir=(0, 0, -1), z_dir=(0, 1, 0))):
        Polygon((0, 0), (0, 15.751075774), (1.25, 15), (1.25, 0), align=None)
    revolve(axis=Axis((42.35, 18, 18), (-1, 0, 0)), mode=Mode.SUBTRACT)

    # Split1 8 outline → Split1 8 (cut)
    with BuildSketch(Plane(origin=(0, 0, 0), x_dir=(1, 0, 0), z_dir=(0, 1, 0))):
        with BuildLine():
            Line((36.05, 22.5), (36.05, -22.5))
            Line((36.05, -22.5), (39.55, -22.5))
            Line((39.55, -22.5), (39.55, 0))
            ThreePointArc((39.55, 0), (41.05, 1.5), (42.55, 0))
            Line((42.55, 0), (42.55, -22.5))
            Line((42.55, -22.5), (56.05, -22.5))
            Line((56.05, -22.5), (56.05, 22.5))
            Line((56.05, 22.5), (36.05, 22.5))
        make_face()
    extrude(amount=SPLIT1_8_DEPTH, mode=Mode.SUBTRACT)


with BuildPart() as body_2:
    # Split1: read off the stored shape, not the designer's step
    # Split1 outline → Split1 (revolve)
    with BuildSketch(Plane(origin=(0, 18.5, -18.5), x_dir=(0, 1, 0), z_dir=(0, 0, -1))):
        Polygon((1.25, 48.15), (0, 47.398924226), (1.25, 47.398924226), align=None)
    revolve(axis=Axis((0, 18.5, -18.5), (1, 0, 0)))

    # Split1 2 outline → Split1 2 (add)
    with BuildSketch(Plane.YZ.offset(SPLIT1_START)):
        with BuildLine():
            ThreePointArc((0, 10), (10, 0), (0, -10))
            Line((0, -10), (0, -22.5))
            Line((0, -22.5), (22.5, -22.5))
            Line((22.5, -22.5), (22.5, 4.186291501))
            ThreePointArc((22.5, 4.186291501), (21.89103626, 7.24775896), (20.156854249, 9.843145751))
            Line((20.156854249, 9.843145751), (9.843145751, 20.156854249))
            ThreePointArc((9.843145751, 20.156854249), (7.24775896, 21.89103626), (4.186291501, 22.5))
            Line((4.186291501, 22.5), (0, 22.5))
            Line((0, 22.5), (0, 10))
        make_face()
    extrude(amount=SPLIT1_2_DEPTH)

    # Split1 3 outline → Split1 3 (add)
    with BuildSketch(Plane.YZ.offset(SPLIT1_START_2)):
        with BuildLine():
            ThreePointArc((0, 19), (19, 0), (0, -19))
            Line((0, -19), (0, -22.5))
            Line((0, -22.5), (22.5, -22.5))
            Line((22.5, -22.5), (22.5, 22.5))
            Line((22.5, 22.5), (0, 22.5))
            Line((0, 22.5), (0, 19))
        make_face()
        with Locations((18.5, -18.5)):
            Circle(SPLIT1_3_OUTLINE_R, mode=Mode.SUBTRACT)
        with Locations((18.5, 18.5)):
            Circle(SPLIT1_3_OUTLINE_R, mode=Mode.SUBTRACT)
    extrude(amount=SPLIT1_3_DEPTH)

    # Split1 4 outline → Split1 4 (add)
    with BuildSketch(Plane.YZ.offset(SPLIT1_START_2)):
        with Locations((18.5, 18.5)):
            Circle(SPLIT1_4_OUTLINE_R)
        with Locations((18.5, -18.5)):
            Circle(SPLIT1_4_OUTLINE_R)
    extrude(amount=SPLIT1_4_DEPTH)

    # Split1 5 outline → Split1 5 (add)
    with BuildSketch(Plane.YZ.offset(SPLIT1_START_3)):
        with Locations((18.5, 18.5)):
            Circle(SPLIT1_5_OUTLINE_R)
    extrude(amount=SPLIT1_5_DEPTH)

    # Split1 6 outline → Split1 6 (cut)
    with BuildSketch(Plane(origin=(0, 0, 0), x_dir=(1, 0, 0), z_dir=(0, 1, 0))):
        with BuildLine():
            ThreePointArc((42.55, 0), (41.05, 1.5), (39.55, 0))
            Line((39.55, 0), (39.55, -22.5))
            Line((39.55, -22.5), (42.55, -22.5))
            Line((42.55, -22.5), (42.55, 0))
        make_face()
    extrude(amount=SPLIT1_6_DEPTH, mode=Mode.SUBTRACT)

    # Split1 7 outline → Split1 7 (revolve, cut)
    with BuildSketch(Plane(origin=(0, 18.5, 18.5), x_dir=(0, 1, 0), z_dir=(0, 0, -1))):
        Polygon((0, 48.15), (0, 47.398924226), (1.25, 48.15), align=None)
    revolve(axis=Axis((0, 18.5, 18.5), (1, 0, 0)), mode=Mode.SUBTRACT)


solid = Compound([part.part, body_2.part])
